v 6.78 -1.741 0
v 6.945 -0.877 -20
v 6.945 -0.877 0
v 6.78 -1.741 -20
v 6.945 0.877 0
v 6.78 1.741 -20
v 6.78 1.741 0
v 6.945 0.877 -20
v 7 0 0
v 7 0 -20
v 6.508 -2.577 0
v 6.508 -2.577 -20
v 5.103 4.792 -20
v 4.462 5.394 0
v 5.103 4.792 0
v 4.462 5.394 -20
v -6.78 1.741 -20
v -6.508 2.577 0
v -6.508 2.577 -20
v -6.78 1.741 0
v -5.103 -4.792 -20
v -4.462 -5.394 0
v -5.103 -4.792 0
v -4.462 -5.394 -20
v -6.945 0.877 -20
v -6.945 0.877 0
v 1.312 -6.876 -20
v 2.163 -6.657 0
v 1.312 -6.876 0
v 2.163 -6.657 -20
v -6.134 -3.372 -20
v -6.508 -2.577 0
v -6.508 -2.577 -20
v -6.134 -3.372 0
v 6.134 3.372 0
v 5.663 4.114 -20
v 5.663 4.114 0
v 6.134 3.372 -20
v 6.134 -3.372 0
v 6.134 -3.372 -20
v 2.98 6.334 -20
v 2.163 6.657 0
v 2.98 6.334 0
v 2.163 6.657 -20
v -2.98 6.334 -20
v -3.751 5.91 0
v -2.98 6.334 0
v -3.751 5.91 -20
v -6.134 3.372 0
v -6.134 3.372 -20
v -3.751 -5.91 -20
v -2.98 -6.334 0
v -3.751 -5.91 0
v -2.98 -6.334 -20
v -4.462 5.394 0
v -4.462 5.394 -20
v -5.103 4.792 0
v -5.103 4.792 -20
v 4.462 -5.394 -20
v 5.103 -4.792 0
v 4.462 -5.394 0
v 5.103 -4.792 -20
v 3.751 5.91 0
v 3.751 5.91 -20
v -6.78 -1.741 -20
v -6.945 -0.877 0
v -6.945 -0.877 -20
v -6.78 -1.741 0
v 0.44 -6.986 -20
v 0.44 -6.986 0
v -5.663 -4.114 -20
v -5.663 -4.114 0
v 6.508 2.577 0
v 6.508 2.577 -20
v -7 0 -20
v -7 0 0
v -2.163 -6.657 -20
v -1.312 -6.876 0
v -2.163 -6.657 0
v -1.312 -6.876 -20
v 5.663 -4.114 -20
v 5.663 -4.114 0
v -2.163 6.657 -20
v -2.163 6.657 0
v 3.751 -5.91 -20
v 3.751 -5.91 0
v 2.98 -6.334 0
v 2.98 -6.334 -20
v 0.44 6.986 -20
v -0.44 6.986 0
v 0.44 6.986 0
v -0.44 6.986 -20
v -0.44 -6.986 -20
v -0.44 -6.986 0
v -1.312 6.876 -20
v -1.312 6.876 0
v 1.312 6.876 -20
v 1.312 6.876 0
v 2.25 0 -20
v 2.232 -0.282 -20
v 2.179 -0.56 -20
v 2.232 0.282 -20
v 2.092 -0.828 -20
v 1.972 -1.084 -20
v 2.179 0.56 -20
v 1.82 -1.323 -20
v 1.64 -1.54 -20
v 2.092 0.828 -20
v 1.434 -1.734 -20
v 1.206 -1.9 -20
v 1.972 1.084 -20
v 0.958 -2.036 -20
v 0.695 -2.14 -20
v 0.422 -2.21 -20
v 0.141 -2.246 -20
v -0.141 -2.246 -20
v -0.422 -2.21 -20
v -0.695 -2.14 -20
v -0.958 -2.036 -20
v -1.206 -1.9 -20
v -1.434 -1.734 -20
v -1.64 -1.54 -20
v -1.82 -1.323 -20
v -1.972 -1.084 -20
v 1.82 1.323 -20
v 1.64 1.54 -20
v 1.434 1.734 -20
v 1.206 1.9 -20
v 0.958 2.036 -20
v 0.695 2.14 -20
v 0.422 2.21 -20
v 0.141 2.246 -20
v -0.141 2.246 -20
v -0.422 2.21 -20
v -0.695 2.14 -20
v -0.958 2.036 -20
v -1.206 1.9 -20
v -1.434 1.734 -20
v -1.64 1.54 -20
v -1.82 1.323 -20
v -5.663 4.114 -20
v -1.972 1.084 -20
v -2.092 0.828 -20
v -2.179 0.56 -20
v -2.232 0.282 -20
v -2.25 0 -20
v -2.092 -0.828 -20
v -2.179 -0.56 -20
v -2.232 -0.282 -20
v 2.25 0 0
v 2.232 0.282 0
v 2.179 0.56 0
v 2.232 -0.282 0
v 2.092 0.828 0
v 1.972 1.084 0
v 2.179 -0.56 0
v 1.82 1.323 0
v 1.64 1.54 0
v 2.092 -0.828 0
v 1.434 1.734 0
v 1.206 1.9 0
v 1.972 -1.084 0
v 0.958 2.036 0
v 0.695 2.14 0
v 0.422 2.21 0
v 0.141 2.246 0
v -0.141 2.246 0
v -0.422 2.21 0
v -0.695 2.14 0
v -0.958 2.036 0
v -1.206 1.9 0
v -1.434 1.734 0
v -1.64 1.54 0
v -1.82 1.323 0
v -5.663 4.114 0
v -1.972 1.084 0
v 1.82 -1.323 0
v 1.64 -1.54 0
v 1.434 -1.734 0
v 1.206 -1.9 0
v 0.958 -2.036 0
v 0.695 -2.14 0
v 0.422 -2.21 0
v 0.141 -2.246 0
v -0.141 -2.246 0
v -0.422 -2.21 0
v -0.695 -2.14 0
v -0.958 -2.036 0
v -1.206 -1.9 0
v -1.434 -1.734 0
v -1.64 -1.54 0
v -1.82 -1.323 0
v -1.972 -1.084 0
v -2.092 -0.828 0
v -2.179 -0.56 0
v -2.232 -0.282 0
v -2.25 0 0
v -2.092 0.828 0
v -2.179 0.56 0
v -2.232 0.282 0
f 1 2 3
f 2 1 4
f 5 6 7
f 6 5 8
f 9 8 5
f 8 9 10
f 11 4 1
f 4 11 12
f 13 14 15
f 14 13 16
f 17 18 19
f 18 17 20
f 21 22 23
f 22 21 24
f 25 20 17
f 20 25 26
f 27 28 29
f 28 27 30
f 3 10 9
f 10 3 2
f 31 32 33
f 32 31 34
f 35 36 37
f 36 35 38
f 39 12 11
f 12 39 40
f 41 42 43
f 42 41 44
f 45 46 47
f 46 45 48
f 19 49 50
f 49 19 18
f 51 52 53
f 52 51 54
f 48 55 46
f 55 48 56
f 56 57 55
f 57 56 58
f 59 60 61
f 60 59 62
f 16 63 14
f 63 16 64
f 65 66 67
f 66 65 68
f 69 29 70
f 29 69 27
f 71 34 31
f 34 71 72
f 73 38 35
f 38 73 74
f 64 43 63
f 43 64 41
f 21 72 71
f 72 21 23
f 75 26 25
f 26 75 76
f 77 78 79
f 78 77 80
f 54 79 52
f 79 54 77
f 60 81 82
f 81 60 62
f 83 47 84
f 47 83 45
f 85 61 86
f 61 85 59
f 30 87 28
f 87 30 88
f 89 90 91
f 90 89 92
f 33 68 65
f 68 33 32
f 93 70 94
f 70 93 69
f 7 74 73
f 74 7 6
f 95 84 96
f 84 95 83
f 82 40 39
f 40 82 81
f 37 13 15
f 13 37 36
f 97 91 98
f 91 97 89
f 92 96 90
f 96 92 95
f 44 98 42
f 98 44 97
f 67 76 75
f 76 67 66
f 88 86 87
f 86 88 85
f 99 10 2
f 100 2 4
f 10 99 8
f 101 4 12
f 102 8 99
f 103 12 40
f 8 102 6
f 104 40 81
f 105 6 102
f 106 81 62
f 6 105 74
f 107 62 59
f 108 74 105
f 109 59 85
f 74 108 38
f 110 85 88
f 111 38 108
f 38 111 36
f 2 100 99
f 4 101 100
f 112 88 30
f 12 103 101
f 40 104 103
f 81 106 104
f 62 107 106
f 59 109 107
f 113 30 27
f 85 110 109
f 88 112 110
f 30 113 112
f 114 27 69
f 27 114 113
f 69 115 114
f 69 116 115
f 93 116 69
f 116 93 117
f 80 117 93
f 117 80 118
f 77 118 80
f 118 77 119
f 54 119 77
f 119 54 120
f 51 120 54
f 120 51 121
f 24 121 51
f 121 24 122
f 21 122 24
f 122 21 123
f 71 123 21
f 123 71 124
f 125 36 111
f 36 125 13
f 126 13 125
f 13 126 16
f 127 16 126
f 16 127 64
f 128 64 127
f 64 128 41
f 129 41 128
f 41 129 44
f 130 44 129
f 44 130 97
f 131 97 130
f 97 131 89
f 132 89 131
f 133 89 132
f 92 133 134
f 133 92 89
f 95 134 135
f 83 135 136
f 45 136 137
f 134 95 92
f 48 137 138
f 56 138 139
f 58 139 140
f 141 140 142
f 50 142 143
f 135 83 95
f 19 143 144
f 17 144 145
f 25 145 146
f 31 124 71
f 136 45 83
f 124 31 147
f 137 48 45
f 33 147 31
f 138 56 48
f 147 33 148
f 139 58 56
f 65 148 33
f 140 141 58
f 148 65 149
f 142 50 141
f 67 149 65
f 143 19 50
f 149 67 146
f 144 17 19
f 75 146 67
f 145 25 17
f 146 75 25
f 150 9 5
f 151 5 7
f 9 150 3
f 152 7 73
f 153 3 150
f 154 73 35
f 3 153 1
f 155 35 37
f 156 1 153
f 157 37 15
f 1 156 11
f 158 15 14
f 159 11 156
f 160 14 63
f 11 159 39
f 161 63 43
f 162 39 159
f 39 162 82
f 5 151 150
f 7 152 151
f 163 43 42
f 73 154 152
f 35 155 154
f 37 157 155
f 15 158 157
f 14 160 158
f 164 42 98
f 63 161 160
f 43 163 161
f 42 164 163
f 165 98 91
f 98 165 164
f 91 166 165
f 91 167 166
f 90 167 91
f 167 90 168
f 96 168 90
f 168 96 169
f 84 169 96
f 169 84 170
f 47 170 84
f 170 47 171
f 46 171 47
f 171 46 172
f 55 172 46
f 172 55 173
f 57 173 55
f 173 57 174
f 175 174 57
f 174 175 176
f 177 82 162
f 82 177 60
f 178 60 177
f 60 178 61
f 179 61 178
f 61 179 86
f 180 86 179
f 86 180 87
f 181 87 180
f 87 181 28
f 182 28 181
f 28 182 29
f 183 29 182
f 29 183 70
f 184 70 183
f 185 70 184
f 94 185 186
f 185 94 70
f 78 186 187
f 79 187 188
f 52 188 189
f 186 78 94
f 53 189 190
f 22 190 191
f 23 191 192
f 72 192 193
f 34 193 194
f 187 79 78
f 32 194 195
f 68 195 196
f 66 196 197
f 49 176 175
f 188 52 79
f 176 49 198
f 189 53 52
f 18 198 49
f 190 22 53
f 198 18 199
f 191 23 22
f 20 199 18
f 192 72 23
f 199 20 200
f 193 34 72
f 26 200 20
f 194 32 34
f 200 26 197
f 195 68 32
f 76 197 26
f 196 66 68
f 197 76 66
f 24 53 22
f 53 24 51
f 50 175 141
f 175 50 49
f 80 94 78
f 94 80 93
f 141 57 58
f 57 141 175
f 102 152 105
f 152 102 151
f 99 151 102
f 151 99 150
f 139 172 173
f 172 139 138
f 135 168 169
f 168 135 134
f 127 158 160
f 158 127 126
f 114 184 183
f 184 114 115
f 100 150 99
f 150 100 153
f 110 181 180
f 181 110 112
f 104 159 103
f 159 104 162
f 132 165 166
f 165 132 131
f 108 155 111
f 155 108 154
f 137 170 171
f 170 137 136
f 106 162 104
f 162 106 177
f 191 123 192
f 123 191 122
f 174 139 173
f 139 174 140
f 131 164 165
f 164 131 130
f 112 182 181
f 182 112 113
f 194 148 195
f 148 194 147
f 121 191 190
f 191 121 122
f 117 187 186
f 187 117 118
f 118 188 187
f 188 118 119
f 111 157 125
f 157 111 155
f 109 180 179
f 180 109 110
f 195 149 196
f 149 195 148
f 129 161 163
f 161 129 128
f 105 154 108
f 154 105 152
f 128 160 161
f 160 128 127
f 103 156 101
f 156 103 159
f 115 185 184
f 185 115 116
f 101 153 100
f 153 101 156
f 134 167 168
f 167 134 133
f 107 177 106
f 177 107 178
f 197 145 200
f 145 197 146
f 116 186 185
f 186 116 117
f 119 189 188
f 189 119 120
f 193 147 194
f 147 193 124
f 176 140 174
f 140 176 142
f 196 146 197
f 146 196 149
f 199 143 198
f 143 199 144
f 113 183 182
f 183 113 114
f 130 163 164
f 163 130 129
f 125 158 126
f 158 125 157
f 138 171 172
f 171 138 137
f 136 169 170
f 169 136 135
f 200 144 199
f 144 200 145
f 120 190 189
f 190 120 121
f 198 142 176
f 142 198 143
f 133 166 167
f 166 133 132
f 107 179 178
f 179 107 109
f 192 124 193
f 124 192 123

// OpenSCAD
$fn = 50;


difference() {
	union() {
		translate(v = [0, 0, -20.0000000000]) {
			cylinder(h = 20, r = 7.0000000000);
		}
		cylinder(h = 0, r = 10.0000000000);
	}
	union() {
		#translate(v = [0, 0, -20]) {
			cylinder(h = 20, r = 2.2500000000);
		}
	}
}
